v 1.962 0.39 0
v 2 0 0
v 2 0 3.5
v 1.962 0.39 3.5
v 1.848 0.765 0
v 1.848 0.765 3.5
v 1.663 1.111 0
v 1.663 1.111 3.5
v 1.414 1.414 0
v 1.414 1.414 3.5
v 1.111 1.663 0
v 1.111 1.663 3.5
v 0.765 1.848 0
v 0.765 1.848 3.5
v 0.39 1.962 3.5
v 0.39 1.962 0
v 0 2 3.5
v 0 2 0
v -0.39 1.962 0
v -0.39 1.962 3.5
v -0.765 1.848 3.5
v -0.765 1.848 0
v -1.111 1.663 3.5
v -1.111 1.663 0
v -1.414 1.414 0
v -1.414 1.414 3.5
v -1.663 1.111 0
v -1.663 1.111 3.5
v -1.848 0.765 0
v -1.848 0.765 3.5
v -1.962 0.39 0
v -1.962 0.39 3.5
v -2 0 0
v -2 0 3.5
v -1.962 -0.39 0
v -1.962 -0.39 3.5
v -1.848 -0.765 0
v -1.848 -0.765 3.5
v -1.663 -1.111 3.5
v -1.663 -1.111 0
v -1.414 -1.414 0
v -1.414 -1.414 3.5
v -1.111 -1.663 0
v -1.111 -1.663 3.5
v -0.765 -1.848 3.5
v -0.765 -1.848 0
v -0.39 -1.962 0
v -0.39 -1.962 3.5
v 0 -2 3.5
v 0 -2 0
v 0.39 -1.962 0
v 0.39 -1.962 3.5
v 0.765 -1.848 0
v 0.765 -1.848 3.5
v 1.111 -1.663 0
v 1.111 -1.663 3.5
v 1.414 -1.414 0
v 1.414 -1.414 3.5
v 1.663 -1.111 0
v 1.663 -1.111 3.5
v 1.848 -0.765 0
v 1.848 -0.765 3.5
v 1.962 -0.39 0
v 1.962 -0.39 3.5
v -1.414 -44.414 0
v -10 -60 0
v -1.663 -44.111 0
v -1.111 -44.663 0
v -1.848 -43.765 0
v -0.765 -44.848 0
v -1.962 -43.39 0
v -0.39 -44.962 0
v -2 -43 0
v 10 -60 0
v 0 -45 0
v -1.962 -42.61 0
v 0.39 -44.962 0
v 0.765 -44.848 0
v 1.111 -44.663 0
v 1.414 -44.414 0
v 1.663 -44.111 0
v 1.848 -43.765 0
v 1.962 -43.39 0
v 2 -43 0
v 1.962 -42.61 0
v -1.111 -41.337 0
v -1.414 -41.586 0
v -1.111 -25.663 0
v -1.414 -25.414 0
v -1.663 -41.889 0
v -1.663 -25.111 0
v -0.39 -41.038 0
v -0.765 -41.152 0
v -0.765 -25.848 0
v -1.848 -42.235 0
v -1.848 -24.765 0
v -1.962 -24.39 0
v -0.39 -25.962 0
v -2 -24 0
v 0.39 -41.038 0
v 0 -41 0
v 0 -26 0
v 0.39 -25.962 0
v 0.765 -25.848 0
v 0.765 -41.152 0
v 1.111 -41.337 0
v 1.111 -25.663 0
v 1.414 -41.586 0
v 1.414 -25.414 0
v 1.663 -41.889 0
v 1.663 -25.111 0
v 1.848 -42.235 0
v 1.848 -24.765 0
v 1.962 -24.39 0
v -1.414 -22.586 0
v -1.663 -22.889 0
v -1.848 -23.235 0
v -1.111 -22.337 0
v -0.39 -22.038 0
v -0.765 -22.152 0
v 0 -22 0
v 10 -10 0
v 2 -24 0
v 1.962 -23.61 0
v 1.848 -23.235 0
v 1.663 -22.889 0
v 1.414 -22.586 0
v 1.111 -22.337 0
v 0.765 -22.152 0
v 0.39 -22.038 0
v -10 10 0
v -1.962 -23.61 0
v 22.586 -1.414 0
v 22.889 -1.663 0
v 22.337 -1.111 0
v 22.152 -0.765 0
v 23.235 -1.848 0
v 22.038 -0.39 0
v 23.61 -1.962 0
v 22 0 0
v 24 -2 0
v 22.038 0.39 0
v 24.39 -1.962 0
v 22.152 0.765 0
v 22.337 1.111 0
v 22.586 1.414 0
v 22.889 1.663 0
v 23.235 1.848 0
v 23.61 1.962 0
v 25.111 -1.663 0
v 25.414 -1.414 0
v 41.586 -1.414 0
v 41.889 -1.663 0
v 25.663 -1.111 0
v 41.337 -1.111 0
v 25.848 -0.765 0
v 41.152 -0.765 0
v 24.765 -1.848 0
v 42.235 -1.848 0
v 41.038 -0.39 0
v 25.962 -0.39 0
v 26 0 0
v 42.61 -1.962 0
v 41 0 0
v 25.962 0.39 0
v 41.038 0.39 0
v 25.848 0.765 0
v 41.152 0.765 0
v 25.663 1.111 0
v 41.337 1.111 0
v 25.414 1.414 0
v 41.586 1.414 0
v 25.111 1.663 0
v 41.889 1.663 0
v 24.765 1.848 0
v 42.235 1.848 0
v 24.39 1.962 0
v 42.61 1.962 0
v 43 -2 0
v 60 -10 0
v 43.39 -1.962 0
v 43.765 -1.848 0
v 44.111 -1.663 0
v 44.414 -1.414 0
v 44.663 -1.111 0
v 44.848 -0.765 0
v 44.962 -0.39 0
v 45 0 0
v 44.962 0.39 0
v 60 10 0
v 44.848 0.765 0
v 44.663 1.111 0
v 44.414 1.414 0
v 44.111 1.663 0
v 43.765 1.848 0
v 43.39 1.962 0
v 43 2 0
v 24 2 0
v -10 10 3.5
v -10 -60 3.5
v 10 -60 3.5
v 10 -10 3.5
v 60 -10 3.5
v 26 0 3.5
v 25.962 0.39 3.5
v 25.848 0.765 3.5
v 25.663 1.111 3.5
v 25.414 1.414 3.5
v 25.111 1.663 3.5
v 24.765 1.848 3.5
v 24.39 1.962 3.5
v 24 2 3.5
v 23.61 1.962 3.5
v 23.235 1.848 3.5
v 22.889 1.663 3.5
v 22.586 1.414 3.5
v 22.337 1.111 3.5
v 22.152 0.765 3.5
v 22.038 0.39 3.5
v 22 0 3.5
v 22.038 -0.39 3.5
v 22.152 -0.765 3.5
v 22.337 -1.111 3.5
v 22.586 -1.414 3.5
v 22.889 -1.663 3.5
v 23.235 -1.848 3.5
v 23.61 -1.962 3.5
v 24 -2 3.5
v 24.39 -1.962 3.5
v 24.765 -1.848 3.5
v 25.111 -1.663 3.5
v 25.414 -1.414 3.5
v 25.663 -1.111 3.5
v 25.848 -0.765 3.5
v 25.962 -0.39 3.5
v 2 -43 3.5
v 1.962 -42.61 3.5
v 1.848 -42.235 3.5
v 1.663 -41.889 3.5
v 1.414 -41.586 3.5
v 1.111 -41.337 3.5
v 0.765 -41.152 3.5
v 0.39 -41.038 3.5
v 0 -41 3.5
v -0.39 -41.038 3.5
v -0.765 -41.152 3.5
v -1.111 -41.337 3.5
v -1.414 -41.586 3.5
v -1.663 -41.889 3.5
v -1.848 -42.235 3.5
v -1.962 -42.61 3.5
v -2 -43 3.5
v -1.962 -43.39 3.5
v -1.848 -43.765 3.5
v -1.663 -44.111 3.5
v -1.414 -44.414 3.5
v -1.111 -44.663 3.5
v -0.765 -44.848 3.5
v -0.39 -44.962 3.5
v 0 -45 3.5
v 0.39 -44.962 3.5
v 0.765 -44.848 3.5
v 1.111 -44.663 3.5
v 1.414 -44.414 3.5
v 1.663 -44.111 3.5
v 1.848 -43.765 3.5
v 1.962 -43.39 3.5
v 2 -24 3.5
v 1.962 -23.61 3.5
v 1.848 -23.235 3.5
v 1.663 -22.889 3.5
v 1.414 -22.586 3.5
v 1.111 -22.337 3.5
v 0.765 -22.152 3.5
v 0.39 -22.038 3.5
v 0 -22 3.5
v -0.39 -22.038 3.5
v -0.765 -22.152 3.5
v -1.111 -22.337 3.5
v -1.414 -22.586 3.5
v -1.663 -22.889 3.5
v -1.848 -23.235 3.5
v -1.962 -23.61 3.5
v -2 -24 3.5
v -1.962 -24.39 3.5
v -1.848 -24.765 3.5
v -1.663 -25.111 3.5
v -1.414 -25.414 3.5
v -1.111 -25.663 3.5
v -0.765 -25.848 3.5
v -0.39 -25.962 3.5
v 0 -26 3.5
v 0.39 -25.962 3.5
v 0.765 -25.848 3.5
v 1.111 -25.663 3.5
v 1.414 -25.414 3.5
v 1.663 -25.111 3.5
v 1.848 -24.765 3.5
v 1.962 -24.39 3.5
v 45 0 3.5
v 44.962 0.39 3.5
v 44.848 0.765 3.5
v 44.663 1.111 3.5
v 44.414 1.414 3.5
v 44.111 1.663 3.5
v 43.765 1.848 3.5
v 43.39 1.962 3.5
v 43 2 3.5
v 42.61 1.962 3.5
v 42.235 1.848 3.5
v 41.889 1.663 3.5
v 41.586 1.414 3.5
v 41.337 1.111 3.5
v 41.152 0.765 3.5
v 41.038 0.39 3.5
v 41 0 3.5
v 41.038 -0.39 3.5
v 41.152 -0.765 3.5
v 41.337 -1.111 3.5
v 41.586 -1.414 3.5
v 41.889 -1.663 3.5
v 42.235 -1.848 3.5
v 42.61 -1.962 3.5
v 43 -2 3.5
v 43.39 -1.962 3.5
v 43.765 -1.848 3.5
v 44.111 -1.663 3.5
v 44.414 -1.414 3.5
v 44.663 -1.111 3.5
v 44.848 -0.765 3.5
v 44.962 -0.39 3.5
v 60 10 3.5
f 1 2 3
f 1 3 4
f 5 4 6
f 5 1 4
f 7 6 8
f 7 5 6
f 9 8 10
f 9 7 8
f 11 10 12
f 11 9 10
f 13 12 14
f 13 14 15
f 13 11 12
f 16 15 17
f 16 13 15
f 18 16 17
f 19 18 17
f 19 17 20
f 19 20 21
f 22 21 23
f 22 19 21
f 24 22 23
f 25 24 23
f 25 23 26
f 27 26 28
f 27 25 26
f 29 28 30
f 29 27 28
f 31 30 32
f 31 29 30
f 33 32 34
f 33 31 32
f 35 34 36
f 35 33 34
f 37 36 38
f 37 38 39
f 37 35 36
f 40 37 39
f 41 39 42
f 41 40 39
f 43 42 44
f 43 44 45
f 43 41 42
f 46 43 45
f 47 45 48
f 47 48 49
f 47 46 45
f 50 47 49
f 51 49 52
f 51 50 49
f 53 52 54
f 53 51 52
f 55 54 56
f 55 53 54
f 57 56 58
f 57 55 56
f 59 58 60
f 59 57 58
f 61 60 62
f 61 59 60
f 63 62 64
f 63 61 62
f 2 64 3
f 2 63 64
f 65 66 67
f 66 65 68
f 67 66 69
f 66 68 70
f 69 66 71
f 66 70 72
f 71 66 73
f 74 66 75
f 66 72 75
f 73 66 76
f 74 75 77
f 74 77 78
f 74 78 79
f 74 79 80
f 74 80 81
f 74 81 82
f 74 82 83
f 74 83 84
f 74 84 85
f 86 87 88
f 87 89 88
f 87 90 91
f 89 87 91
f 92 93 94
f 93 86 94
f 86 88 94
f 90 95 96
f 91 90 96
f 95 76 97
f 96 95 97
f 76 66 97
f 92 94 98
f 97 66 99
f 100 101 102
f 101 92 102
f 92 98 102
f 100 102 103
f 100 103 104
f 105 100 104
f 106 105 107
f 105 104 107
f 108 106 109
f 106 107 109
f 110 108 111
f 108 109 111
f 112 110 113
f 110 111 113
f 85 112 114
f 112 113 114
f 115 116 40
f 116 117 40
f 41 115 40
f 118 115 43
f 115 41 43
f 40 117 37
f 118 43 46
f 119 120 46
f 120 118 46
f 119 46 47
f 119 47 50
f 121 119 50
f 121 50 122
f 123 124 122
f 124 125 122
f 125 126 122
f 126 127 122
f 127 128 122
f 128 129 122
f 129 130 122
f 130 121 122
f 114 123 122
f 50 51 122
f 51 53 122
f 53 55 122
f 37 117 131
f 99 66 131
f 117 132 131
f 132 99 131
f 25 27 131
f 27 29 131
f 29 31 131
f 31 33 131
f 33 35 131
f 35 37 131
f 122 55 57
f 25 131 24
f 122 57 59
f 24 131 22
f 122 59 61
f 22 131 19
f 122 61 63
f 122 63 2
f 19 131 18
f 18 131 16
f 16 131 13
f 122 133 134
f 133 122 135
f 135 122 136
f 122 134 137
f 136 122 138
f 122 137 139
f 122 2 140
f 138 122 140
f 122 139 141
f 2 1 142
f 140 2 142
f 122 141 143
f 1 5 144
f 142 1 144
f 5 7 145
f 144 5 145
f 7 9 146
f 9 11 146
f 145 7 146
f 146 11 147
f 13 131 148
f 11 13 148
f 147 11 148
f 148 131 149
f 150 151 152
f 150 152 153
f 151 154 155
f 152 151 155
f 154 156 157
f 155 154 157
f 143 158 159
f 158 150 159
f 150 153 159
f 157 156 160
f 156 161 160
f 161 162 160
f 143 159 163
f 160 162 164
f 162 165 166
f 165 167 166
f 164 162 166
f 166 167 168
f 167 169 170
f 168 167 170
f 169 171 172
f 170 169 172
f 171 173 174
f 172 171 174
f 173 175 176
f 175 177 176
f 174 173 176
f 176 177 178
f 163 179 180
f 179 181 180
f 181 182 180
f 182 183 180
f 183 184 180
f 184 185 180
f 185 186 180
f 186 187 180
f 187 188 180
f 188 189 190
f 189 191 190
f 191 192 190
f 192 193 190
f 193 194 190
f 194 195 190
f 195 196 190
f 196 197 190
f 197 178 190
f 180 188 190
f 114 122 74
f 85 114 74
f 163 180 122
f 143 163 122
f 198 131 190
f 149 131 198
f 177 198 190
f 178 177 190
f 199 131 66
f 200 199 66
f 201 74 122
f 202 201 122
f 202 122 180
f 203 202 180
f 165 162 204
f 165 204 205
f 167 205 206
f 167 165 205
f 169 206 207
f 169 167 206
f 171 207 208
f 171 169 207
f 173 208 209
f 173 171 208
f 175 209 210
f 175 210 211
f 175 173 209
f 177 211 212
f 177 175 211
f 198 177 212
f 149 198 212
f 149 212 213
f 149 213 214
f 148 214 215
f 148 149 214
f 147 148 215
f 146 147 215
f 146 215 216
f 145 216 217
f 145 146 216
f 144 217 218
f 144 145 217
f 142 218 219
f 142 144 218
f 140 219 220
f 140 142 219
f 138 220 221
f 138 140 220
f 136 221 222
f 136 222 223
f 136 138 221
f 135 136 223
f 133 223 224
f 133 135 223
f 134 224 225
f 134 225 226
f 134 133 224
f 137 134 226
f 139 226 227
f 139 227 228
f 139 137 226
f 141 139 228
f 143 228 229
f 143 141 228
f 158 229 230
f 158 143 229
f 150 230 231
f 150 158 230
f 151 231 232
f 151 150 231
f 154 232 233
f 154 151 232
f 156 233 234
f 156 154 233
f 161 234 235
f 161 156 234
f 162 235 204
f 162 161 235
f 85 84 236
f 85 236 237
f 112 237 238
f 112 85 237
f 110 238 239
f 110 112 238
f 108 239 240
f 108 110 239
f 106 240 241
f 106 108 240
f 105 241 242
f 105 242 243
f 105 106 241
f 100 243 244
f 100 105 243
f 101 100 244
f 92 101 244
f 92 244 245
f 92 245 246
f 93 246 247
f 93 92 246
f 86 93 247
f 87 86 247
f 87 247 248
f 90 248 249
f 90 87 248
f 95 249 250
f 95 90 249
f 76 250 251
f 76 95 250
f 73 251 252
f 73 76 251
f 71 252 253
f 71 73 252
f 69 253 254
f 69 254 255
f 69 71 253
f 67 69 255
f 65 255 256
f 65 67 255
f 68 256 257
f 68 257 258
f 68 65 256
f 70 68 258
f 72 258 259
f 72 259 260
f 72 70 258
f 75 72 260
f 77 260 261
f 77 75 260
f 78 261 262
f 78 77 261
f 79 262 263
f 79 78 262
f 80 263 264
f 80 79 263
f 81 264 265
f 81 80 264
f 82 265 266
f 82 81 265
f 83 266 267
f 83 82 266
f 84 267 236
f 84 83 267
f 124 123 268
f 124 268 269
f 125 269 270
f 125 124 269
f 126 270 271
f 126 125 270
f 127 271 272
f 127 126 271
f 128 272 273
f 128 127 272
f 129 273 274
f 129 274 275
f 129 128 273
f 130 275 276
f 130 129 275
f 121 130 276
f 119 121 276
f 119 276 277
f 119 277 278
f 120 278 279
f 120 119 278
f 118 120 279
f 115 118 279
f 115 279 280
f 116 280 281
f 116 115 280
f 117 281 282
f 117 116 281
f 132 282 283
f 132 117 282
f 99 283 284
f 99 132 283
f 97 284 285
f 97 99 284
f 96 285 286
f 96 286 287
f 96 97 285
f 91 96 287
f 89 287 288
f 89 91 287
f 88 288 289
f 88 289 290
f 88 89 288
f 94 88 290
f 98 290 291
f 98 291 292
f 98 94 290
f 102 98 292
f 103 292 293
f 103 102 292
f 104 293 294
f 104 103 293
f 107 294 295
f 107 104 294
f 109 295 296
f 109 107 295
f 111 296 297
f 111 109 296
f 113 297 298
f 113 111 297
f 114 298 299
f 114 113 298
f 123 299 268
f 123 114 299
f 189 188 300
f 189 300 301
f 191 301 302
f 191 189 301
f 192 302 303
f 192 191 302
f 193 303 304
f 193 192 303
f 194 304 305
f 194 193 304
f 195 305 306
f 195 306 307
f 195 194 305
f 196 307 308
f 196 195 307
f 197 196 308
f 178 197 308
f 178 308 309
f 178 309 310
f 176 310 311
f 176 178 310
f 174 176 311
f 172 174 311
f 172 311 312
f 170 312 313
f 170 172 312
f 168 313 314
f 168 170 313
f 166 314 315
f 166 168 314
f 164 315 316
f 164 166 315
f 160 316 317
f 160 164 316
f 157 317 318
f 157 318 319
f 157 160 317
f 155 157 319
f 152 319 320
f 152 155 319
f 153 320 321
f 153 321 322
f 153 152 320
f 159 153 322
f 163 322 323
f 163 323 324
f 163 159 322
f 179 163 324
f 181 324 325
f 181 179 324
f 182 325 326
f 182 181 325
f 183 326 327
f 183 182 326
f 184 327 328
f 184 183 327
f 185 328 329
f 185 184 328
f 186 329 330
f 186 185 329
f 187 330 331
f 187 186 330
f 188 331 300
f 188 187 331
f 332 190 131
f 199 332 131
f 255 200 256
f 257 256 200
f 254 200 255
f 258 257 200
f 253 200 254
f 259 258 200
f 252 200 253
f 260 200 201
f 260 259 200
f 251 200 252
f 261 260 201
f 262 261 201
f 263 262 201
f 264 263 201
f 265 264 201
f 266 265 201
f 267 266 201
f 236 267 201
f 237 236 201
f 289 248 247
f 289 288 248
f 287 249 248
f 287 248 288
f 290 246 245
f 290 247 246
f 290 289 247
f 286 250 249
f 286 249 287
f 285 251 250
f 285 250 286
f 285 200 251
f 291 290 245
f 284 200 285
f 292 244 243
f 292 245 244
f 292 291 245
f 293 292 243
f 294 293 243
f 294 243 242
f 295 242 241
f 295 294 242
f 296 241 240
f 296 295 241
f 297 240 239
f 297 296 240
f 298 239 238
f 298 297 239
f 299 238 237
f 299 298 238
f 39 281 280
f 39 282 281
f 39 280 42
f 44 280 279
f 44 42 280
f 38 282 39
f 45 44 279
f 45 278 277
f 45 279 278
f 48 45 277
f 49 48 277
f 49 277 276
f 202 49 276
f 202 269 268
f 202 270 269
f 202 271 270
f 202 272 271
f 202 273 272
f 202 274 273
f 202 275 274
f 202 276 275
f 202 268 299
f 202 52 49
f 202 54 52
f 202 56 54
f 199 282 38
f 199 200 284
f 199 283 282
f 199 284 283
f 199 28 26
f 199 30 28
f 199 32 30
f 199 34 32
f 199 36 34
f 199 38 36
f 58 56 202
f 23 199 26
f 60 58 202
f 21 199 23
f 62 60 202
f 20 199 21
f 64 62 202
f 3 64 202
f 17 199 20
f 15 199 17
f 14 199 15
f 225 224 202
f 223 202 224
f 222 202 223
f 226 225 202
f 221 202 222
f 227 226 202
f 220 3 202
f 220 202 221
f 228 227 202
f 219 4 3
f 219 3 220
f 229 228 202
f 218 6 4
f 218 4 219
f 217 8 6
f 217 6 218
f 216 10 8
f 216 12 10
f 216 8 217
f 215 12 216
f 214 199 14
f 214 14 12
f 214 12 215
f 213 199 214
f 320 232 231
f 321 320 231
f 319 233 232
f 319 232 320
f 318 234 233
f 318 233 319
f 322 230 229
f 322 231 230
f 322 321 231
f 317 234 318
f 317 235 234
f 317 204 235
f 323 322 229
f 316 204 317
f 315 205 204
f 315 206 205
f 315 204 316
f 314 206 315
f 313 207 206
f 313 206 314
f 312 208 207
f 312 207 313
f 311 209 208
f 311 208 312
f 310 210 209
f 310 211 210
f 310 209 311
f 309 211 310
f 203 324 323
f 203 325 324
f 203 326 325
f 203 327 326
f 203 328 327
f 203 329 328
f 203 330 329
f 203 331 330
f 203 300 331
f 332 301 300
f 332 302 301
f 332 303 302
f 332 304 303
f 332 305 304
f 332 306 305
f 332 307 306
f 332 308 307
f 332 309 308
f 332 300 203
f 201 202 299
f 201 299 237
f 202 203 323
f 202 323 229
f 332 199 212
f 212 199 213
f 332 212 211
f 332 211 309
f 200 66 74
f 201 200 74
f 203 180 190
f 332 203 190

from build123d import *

# Parameters (mm, degrees)
F0_R     = 2
F1_DEPTH = 3.5


with BuildPart() as f1:
    # F0 (on Top) → F1 (new body)
    with BuildSketch(Plane.XY):
        Polygon((-10, -10), (-10, -60), (10, -60), (10, -10), (60, -10), (60, 10), (10, 10), (-10, 10), align=None)
        with Locations((0, -43)):
            Circle(F0_R, mode=Mode.SUBTRACT)
        with Locations((0, -24)):
            Circle(F0_R, mode=Mode.SUBTRACT)
        Circle(F0_R, mode=Mode.SUBTRACT)
        with Locations((24, 0)):
            Circle(F0_R, mode=Mode.SUBTRACT)
        with Locations((43, 0)):
            Circle(F0_R, mode=Mode.SUBTRACT)
    extrude(amount=F1_DEPTH)


solid = f1.part
